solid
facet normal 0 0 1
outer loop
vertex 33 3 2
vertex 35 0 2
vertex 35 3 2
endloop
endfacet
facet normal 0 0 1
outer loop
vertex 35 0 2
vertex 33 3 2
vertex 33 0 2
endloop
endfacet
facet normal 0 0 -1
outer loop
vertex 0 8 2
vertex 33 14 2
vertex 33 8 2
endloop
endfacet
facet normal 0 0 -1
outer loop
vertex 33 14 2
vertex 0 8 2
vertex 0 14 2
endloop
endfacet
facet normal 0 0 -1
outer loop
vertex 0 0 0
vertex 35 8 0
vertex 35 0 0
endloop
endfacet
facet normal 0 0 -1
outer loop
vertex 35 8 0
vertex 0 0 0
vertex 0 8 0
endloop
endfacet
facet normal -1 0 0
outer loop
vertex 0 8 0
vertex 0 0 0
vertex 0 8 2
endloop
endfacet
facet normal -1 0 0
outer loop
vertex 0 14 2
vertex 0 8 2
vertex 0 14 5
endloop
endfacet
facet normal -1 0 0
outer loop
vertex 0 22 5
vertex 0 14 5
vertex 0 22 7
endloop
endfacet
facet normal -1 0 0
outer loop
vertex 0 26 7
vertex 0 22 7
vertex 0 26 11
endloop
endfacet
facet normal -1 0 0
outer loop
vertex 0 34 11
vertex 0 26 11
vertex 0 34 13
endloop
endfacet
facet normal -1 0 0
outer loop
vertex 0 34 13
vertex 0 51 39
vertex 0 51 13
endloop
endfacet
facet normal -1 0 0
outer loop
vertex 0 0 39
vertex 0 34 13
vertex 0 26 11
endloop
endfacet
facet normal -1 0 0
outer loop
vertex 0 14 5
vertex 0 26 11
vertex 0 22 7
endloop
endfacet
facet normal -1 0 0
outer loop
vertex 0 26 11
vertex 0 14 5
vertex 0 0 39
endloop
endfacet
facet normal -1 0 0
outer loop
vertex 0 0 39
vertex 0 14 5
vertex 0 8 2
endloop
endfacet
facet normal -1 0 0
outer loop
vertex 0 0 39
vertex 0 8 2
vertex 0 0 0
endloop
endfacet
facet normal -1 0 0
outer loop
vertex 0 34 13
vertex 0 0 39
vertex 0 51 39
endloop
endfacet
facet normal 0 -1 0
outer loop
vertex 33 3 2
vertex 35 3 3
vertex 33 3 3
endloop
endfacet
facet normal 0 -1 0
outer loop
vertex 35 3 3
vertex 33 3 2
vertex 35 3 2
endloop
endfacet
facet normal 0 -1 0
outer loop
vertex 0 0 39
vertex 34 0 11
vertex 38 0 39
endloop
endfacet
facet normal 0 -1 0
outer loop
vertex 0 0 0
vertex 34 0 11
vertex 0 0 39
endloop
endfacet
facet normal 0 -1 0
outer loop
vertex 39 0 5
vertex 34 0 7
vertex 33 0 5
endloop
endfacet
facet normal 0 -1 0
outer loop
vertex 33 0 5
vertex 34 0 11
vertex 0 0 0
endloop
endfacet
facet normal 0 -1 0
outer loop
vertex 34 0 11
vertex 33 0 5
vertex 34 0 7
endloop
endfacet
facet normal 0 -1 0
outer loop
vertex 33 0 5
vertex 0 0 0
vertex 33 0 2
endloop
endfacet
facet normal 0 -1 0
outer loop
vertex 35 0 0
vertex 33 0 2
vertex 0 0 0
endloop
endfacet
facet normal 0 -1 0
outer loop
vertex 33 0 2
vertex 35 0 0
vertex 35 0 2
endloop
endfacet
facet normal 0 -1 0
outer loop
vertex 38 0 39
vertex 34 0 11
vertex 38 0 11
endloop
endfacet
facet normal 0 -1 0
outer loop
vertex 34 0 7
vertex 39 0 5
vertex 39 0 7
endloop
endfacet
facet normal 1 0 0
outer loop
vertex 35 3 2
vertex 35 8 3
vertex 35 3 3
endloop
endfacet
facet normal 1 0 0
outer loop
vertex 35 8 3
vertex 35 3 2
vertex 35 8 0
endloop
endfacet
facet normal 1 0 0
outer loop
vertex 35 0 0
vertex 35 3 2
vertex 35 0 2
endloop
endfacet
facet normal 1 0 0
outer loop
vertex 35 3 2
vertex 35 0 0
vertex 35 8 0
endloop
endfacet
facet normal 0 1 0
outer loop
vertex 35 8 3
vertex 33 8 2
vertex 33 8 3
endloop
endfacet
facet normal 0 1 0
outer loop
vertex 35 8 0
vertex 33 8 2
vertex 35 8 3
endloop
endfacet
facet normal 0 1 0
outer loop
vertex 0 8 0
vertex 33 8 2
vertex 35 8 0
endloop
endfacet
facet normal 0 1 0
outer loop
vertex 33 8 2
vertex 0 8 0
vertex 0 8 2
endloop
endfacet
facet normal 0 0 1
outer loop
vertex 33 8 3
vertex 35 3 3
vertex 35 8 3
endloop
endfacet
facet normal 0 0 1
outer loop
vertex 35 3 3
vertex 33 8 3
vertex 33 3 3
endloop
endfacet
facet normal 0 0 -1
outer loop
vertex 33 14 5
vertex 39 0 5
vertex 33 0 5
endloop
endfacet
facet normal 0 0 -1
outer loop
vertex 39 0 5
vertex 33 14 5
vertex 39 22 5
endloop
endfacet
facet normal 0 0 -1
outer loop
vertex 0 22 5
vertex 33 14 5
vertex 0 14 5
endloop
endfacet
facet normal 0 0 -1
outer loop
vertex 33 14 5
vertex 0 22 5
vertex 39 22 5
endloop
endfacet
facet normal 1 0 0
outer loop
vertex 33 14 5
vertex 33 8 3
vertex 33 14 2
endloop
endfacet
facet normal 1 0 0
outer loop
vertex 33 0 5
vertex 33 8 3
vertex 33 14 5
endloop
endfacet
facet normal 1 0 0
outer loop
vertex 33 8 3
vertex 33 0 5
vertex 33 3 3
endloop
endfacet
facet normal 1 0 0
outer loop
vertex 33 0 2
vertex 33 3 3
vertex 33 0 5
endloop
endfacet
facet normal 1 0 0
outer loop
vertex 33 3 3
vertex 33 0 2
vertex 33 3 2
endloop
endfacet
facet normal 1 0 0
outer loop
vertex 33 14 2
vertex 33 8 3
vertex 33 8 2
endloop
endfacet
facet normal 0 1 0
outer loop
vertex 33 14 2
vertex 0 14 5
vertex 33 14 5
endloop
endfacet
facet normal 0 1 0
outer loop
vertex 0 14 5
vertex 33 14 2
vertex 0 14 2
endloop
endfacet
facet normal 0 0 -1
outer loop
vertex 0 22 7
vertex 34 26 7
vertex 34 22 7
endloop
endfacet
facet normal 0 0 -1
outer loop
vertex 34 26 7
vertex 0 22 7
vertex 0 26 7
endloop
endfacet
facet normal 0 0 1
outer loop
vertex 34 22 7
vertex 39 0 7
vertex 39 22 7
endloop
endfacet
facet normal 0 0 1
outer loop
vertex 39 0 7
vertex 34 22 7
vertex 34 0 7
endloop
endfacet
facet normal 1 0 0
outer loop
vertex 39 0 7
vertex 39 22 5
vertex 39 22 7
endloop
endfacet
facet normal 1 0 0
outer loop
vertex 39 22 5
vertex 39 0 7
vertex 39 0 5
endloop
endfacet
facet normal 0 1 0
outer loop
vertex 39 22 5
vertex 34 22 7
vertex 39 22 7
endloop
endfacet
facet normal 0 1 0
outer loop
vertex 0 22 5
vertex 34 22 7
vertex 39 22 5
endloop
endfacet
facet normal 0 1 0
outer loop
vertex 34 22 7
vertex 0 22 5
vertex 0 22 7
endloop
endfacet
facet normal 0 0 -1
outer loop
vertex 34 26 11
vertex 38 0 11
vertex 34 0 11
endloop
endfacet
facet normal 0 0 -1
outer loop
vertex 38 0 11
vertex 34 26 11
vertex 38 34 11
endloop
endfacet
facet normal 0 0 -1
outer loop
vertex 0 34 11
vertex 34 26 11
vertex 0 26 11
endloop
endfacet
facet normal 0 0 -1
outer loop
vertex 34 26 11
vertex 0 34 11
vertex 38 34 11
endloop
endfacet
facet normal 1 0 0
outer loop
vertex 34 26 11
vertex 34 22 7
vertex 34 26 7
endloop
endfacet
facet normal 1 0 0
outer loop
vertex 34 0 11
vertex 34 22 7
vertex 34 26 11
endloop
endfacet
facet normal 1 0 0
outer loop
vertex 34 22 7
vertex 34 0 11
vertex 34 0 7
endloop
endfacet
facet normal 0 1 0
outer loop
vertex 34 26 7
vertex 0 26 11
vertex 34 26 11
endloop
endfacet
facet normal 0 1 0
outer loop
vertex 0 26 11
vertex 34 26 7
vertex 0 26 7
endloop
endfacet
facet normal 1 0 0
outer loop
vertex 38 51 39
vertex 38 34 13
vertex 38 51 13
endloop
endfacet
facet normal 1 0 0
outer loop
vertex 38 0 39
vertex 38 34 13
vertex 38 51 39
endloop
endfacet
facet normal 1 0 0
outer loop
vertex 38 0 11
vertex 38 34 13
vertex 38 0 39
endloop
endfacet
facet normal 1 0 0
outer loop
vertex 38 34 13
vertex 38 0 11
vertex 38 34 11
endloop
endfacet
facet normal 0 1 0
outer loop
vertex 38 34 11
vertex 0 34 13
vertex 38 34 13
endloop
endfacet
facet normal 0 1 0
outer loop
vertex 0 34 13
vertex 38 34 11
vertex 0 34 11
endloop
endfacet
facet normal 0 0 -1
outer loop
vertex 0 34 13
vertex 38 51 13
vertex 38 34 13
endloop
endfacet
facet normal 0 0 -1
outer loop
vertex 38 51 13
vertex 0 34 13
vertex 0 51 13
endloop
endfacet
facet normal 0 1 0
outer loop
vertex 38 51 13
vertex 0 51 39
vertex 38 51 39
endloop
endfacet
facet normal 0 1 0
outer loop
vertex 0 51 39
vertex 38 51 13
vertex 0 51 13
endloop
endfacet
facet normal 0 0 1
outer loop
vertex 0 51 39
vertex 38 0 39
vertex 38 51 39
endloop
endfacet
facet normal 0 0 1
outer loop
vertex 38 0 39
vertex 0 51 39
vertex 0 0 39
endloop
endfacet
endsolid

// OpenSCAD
translate([2.5, 1.5, 1.0]) color([0.6256424909314248, 0.3892618991218443, 0.8801466287862422]) cube([5, 3, 2], center=true);
translate([7.5, 1.5, 1.0]) color([0.03841723935819574, 0.465312990207844, 0.8298523393928158]) cube([5, 3, 2], center=true);
translate([12.5, 1.5, 1.0]) color([0.12681348297309336, 0.7104875615116192, 0.32811584191028165]) cube([5, 3, 2], center=true);
translate([17.5, 1.5, 1.0]) color([0.02430127857694553, 0.4737249308893109, 0.521692738945335]) cube([5, 3, 2], center=true);
translate([22.5, 1.5, 1.0]) color([0.04158625067384558, 0.5659193535517807, 0.34743383795783944]) cube([5, 3, 2], center=true);
translate([27.5, 1.5, 1.0]) color([0.004493207256296983, 0.19077338067656535, 0.11081067227867492]) cube([5, 3, 2], center=true);
translate([32.5, 1.5, 1.0]) color([0.5406219547324049, 0.043120163042338455, 0.9281325700980793]) cube([5, 3, 2], center=true);
translate([3.5, 5.5, 1.5]) color([0.8450619723983726, 0.9452976437314561, 0.31480103278643345]) cube([7, 5, 3], center=true);
translate([10.5, 5.5, 1.5]) color([0.9052673885618943, 0.984312422520035, 0.7647314342526466]) cube([7, 5, 3], center=true);
translate([17.5, 5.5, 1.5]) color([0.2750826135755835, 0.6708893041471536, 0.5956631537339799]) cube([7, 5, 3], center=true);
translate([24.5, 5.5, 1.5]) color([0.40420330216444333, 0.3060978540144266, 0.059848190567730275]) cube([7, 5, 3], center=true);
translate([31.5, 5.5, 1.5]) color([0.12538247475645914, 0.13395615600511968, 0.48089286465431025]) cube([7, 5, 3], center=true);
translate([5.5, 3.5, 3.5]) color([0.6418933847268948, 0.7640684524444807, 0.046713759972221824]) cube([11, 7, 3], center=true);
translate([16.5, 3.5, 3.5]) color([0.8237598726124178, 0.04347122329095843, 0.5549468300580123]) cube([11, 7, 3], center=true);
translate([27.5, 3.5, 3.5]) color([0.7441478498080107, 0.631221371794228, 0.949678675683002]) cube([11, 7, 3], center=true);
translate([5.5, 10.5, 3.5]) color([0.3446983531128357, 0.5858833552375392, 0.08279906273431636]) cube([11, 7, 3], center=true);
translate([16.5, 10.5, 3.5]) color([0.5597965879322987, 0.8132988010762888, 0.20160451382548072]) cube([11, 7, 3], center=true);
translate([27.5, 10.5, 3.5]) color([0.26096450036718066, 0.7004056402196938, 0.25388196693606324]) cube([11, 7, 3], center=true);
translate([6.5, 5.5, 6.0]) color([0.25924547402140496, 0.9355152879393015, 0.9985430308431146]) cube([13, 11, 2], center=true);
translate([19.5, 5.5, 6.0]) color([0.15519843069219807, 0.9001623872580004, 0.552726485973739]) cube([13, 11, 2], center=true);
translate([32.5, 5.5, 6.0]) color([0.038601142410517486, 0.5855027152371853, 0.641549650670755]) cube([13, 11, 2], center=true);
translate([6.5, 16.5, 6.0]) color([0.0337956987021093, 0.7576919221586004, 0.817800141474185]) cube([13, 11, 2], center=true);
translate([19.5, 16.5, 6.0]) color([0.07164324218695617, 0.6483999400661788, 0.4565474809027662]) cube([13, 11, 2], center=true);
translate([32.5, 16.5, 6.0]) color([0.2387212873419211, 0.4586703816224843, 0.15938970975228217]) cube([13, 11, 2], center=true);
translate([8.5, 6.5, 9.0]) color([0.33366590673229635, 0.6552072997009475, 0.4764855561518734]) cube([17, 13, 4], center=true);
translate([25.5, 6.5, 9.0]) color([0.5559200946775417, 0.5434427938045303, 0.8205942401116392]) cube([17, 13, 4], center=true);
translate([8.5, 19.5, 9.0]) color([0.3433827981536126, 0.8129620907818157, 0.07998708713040747]) cube([17, 13, 4], center=true);
translate([25.5, 19.5, 9.0]) color([0.4277330458726053, 0.352320116536872, 0.451580638705249]) cube([17, 13, 4], center=true);
translate([9.5, 8.5, 12.0]) color([0.8335098205362665, 0.5123994004879511, 0.9872466462948367]) cube([19, 17, 2], center=true);
translate([28.5, 8.5, 12.0]) color([0.8614607202751068, 0.11884674531302208, 0.3168915355616677]) cube([19, 17, 2], center=true);
translate([9.5, 25.5, 12.0]) color([0.022725501526886682, 0.7337534213446073, 0.019200804366837798]) cube([19, 17, 2], center=true);
translate([28.5, 25.5, 12.0]) color([0.8859385148247924, 0.19334286484226215, 0.4138362902804684]) cube([19, 17, 2], center=true);
translate([9.5, 8.5, 19.5]) color([0.06203930600614804, 0.3112548872587563, 0.3895149894928328]) cube([19, 17, 13], center=true);
translate([28.5, 8.5, 19.5]) color([0.052230973545080106, 0.7675506531778632, 0.7113497195255859]) cube([19, 17, 13], center=true);
translate([9.5, 25.5, 19.5]) color([0.35788362412452357, 0.835192553154071, 0.07742180234362261]) cube([19, 17, 13], center=true);
translate([28.5, 25.5, 19.5]) color([0.05400640100767218, 0.35498029443727297, 0.9018413321683949]) cube([19, 17, 13], center=true);
translate([9.5, 42.5, 19.5]) color([0.7564677019106462, 0.6723176785539303, 0.5627357352457344]) cube([19, 17, 13], center=true);
translate([28.5, 42.5, 19.5]) color([0.80376553873448, 0.41222669318814775, 0.030688579780824843]) cube([19, 17, 13], center=true);
translate([9.5, 8.5, 32.5]) color([0.8024042864453003, 0.1904934342897321, 0.3876588498360868]) cube([19, 17, 13], center=true);
translate([28.5, 8.5, 32.5]) color([0.3576093472265096, 0.12336562593420342, 0.3507843689720118]) cube([19, 17, 13], center=true);
translate([9.5, 25.5, 32.5]) color([0.17708687785091481, 0.6160138300848896, 0.6534343577697814]) cube([19, 17, 13], center=true);
translate([28.5, 25.5, 32.5]) color([0.013646552881622753, 0.45647585236099164, 0.5540526564867162]) cube([19, 17, 13], center=true);
translate([9.5, 42.5, 32.5]) color([0.8716629944357835, 0.49603131023446156, 0.08045043690485232]) cube([19, 17, 13], center=true);
translate([28.5, 42.5, 32.5]) color([0.051723879096013836, 0.8621090829516437, 0.7907294093349121]) cube([19, 17, 13], center=true);
